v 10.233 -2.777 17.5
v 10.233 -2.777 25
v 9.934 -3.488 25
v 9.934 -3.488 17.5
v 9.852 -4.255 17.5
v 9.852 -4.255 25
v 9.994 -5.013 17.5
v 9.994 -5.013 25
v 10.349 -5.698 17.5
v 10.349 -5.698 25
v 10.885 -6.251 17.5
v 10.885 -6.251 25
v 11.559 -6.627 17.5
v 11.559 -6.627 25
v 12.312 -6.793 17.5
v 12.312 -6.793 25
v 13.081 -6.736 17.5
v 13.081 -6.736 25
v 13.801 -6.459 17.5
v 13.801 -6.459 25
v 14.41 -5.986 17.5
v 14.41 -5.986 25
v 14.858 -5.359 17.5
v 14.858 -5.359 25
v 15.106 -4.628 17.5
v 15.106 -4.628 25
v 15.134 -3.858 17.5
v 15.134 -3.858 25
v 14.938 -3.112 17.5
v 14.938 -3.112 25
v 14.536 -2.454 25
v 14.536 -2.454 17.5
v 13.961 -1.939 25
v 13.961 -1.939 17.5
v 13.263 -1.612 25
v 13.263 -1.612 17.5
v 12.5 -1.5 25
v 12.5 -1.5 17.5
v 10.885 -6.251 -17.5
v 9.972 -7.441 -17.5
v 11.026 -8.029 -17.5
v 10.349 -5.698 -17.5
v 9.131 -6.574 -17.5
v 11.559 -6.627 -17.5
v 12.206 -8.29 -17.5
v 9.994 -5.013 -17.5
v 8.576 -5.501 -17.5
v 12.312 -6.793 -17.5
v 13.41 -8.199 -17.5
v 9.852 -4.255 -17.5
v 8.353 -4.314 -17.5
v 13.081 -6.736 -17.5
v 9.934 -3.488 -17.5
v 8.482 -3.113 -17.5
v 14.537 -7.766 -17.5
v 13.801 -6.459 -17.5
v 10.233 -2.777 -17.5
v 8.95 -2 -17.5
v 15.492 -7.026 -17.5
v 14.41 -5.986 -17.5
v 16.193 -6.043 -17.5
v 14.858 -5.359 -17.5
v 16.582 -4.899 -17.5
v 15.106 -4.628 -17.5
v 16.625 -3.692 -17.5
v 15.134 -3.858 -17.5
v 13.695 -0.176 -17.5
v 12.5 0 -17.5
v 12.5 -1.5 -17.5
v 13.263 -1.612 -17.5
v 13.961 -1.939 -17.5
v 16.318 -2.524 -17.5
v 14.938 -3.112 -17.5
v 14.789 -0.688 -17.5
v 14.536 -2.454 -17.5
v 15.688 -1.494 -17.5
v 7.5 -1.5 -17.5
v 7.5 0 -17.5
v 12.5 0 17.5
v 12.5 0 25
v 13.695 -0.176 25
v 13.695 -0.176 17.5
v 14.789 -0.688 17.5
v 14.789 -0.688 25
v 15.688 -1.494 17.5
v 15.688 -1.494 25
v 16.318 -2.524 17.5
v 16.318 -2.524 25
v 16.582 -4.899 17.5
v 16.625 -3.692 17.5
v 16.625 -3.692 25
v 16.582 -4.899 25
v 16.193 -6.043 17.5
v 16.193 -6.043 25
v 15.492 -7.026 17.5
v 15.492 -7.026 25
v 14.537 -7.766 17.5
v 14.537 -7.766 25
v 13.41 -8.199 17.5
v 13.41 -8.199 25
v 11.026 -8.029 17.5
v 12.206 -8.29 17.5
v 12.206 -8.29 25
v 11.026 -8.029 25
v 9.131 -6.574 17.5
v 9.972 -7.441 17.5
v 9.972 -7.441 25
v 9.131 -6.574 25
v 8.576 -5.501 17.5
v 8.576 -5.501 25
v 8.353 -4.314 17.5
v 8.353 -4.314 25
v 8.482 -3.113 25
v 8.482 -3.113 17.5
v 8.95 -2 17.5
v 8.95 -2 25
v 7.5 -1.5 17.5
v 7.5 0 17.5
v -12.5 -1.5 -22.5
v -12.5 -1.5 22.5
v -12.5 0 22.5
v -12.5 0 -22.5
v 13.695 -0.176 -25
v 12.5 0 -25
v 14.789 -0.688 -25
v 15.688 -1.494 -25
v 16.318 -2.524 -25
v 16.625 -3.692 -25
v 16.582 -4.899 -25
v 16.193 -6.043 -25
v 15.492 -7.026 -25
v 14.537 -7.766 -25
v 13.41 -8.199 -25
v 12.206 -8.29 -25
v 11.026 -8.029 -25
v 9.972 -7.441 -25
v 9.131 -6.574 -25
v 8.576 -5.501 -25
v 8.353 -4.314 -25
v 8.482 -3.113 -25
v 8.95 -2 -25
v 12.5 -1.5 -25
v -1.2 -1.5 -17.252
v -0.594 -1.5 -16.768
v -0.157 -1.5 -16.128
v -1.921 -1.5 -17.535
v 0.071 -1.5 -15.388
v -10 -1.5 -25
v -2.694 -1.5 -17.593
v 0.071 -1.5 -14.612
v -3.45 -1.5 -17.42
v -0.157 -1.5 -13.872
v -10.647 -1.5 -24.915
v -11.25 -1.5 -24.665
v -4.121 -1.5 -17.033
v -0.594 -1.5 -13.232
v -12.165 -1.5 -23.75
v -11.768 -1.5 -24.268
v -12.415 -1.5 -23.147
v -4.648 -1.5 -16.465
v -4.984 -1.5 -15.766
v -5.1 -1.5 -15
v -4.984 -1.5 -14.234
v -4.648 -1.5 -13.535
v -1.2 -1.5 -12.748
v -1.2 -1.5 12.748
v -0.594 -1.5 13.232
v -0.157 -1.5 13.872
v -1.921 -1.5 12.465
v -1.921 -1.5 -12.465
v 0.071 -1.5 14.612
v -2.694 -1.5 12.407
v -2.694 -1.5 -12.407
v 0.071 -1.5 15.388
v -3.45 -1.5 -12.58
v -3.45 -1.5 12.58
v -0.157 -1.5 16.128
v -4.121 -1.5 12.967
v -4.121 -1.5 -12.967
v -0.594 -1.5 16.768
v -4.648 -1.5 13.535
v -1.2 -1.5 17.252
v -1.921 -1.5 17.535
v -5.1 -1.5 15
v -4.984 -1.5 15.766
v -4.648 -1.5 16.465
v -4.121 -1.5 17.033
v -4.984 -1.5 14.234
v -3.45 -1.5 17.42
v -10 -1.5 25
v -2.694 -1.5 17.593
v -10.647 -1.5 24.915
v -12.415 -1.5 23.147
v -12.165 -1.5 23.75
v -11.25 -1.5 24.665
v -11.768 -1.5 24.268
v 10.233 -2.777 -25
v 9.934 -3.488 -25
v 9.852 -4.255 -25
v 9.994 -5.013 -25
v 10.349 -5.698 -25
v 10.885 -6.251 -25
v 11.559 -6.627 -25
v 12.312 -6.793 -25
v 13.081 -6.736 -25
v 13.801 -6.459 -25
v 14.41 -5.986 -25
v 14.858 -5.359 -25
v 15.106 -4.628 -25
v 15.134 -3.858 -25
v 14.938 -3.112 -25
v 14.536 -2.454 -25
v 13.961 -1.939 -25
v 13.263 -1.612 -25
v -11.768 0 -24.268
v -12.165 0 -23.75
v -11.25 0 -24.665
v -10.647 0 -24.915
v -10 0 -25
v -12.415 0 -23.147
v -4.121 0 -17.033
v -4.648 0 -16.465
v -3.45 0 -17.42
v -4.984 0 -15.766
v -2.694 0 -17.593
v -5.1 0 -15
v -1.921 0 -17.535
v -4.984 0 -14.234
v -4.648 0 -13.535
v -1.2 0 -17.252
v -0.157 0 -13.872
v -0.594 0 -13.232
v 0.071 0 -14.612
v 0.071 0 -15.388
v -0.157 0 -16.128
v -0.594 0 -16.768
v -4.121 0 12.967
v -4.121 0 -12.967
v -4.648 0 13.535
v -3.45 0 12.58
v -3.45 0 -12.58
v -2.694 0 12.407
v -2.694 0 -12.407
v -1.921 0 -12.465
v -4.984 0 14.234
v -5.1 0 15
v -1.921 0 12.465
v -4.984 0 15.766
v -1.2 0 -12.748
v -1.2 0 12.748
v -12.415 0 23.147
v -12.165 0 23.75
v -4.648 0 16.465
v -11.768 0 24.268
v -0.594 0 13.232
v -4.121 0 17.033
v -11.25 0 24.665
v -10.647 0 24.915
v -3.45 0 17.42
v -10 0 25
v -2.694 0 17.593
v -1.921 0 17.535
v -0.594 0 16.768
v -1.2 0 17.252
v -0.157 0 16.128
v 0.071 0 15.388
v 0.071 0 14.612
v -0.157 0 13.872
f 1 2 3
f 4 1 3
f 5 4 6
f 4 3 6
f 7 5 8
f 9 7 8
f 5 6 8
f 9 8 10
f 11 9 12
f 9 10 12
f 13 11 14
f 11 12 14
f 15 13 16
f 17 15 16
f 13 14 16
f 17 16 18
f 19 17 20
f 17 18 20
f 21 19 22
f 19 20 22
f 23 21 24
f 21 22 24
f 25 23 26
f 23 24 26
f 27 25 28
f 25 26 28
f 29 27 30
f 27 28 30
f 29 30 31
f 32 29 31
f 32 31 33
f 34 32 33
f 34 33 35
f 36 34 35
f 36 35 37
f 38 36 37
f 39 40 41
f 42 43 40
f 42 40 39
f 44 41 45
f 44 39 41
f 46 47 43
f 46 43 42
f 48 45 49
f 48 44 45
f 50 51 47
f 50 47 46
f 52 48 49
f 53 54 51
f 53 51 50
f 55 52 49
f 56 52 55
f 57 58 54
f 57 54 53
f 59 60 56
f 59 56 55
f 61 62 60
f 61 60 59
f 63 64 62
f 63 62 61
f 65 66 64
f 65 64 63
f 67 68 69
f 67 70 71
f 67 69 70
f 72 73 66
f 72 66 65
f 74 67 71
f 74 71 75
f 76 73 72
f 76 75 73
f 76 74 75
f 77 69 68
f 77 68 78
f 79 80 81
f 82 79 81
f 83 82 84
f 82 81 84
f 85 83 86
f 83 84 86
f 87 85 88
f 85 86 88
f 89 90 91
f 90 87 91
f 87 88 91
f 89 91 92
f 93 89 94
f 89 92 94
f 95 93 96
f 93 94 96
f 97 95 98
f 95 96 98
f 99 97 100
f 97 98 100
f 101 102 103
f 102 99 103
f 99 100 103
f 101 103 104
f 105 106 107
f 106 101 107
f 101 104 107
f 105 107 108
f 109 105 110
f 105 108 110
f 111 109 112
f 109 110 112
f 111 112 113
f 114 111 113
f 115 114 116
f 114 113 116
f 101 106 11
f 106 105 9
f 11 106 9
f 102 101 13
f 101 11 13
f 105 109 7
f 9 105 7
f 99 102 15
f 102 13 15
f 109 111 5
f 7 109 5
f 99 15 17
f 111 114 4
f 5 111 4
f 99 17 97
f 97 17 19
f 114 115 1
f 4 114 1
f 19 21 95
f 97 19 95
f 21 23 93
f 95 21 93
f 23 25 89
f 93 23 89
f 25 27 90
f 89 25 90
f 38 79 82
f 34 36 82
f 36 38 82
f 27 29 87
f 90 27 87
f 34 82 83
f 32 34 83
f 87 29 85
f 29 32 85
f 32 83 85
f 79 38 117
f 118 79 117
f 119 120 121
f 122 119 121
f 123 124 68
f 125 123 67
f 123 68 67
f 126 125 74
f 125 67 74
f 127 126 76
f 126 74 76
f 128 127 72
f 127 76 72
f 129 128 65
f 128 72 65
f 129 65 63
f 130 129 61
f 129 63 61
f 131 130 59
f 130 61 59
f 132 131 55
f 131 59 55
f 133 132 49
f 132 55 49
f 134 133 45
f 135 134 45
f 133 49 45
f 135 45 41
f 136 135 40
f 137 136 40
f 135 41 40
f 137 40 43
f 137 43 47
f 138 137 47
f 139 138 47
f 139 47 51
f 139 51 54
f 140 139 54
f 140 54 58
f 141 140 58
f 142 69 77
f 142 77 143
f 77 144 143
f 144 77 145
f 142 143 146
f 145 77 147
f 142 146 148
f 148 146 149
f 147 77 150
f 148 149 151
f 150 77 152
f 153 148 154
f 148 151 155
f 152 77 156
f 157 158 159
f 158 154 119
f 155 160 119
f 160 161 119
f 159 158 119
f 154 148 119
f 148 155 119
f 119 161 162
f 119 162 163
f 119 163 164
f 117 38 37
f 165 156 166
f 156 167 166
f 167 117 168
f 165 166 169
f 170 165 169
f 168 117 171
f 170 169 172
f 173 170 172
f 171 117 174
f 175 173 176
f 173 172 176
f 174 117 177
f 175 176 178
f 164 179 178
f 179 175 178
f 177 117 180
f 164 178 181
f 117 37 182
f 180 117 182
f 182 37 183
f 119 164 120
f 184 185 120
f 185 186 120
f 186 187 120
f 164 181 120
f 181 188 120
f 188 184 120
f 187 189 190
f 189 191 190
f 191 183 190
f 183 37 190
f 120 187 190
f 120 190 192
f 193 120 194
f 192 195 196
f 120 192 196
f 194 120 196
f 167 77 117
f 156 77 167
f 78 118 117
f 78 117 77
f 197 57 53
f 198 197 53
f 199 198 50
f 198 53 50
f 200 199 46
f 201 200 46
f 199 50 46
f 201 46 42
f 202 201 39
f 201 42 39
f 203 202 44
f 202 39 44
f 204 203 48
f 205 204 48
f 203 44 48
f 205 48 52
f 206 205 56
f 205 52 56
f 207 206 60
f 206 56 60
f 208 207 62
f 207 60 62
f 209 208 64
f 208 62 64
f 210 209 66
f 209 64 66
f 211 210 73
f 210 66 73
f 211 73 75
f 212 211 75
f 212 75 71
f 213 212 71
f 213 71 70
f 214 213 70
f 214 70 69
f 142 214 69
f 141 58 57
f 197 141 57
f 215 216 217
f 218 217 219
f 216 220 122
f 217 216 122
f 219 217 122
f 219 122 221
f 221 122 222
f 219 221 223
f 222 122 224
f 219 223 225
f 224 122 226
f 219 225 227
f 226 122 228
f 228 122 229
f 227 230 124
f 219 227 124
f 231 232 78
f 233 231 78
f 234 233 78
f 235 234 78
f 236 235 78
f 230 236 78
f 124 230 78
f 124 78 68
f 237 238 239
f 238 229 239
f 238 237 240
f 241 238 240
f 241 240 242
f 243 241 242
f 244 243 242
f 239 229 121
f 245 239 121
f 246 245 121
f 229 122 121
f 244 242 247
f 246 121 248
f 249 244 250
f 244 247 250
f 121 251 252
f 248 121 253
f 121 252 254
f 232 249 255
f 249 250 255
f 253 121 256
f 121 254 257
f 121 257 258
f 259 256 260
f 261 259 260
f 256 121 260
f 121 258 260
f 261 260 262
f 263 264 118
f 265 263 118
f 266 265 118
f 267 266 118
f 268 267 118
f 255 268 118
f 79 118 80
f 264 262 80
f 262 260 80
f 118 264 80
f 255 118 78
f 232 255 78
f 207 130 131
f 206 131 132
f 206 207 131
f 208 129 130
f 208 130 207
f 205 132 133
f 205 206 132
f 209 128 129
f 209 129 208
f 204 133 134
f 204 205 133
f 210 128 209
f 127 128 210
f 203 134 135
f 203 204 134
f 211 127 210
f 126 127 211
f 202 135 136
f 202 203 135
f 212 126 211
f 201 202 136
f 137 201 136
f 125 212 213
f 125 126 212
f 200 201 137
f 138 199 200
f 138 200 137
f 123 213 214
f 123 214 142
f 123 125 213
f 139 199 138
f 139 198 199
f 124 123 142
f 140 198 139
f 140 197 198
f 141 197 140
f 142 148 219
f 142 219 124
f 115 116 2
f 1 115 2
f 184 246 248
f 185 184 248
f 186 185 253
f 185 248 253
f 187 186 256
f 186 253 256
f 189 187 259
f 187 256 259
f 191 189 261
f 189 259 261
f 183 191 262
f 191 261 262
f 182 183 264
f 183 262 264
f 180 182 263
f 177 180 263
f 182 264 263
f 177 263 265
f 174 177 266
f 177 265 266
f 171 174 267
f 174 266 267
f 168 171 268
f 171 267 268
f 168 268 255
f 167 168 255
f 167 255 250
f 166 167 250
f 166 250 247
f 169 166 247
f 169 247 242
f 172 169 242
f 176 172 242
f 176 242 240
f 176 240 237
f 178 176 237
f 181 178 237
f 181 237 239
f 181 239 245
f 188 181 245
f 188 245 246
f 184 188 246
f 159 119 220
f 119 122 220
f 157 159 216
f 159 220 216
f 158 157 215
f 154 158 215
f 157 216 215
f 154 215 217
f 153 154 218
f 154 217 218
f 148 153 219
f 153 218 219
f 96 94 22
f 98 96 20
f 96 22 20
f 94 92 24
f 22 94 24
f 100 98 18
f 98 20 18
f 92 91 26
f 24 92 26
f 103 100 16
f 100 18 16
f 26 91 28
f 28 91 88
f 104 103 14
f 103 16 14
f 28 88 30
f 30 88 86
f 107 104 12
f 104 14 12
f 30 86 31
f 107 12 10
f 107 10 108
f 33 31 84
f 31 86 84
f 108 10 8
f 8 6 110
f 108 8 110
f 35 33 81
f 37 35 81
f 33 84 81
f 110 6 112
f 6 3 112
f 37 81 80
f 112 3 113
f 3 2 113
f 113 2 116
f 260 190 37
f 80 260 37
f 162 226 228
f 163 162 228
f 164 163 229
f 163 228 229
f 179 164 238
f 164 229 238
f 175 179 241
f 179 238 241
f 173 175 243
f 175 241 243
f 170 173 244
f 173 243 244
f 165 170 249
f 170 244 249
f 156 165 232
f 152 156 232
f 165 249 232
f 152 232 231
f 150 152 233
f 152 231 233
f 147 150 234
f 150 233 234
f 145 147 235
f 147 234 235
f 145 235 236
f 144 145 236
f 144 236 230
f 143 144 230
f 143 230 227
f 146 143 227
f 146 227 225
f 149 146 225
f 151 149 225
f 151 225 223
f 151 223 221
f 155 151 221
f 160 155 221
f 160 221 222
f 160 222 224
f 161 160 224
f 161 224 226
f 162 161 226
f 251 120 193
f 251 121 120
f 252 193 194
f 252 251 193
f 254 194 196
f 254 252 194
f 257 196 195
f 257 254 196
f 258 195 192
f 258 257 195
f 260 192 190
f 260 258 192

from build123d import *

# Parameters (mm, degrees)
TABAN_FLAN_1_DEPTH    = 25
IZIM9_W               = 9.15
IZIM9_H               = 35
KES_EKSTR_ZYON1_DEPTH = 32.162677998
IZIM11_R              = 2.6
KES_EKSTR_ZYON2_DEPTH = 10
RADYUS1_R             = 2.5


# Sheet-metal steps are written as plain solids
with BuildPart() as part:
    # Çizim1 → Taban-Flanş1 (new, symmetric)
    with BuildSketch(Plane.XY):
        with BuildLine():
            Line((-12.5, 0), (12.5, 0))
            ThreePointArc((12.5, 0), (14.537154879, -7.765591238), (8.95035213, -2))
            Line((8.95035213, -2), (10.233357384, -2.777108434))
            ThreePointArc((10.233357384, -2.777108434), (13.800833838, -6.458751031), (12.5, -1.5))
            Line((12.5, -1.5), (-12.5, -1.5))
            Line((-12.5, -1.5), (-12.5, 0))
        make_face()
    extrude(amount=TABAN_FLAN_1_DEPTH, both=True)

    # Çizim9 → Kes-Ekstrüzyon1 (cut, through all)
    with BuildSketch(Plane(origin=(0, 0, 0), x_dir=(1, 0, 0), z_dir=(0, 1, 0))):
        with Locations((12.075, 0)):
            Rectangle(IZIM9_W, IZIM9_H)
    extrude(amount=-KES_EKSTR_ZYON1_DEPTH, mode=Mode.SUBTRACT)

    # Çizim11 → Kes-Ekstrüzyon2 (cut)
    with BuildSketch(Plane(origin=(0, 0, 0), x_dir=(1, 0, 0), z_dir=(0, 1, 0))):
        with Locations(Location((-2.5, 15, 0), (0, 0, 180))):
            Circle(IZIM11_R)
        with Locations(Location((-2.5, -15, 0), (0, 0, 180))):
            Circle(IZIM11_R)
    extrude(amount=-KES_EKSTR_ZYON2_DEPTH, mode=Mode.SUBTRACT)

    # Radyus1
    radyus1_edges = [part.edges().sort_by_distance(p)[0] for p in [
        (-12.5, -0.75, 25),
        (-12.5, -0.75, -25),
    ]]
    fillet(radyus1_edges, radius=RADYUS1_R)


solid = part.part
